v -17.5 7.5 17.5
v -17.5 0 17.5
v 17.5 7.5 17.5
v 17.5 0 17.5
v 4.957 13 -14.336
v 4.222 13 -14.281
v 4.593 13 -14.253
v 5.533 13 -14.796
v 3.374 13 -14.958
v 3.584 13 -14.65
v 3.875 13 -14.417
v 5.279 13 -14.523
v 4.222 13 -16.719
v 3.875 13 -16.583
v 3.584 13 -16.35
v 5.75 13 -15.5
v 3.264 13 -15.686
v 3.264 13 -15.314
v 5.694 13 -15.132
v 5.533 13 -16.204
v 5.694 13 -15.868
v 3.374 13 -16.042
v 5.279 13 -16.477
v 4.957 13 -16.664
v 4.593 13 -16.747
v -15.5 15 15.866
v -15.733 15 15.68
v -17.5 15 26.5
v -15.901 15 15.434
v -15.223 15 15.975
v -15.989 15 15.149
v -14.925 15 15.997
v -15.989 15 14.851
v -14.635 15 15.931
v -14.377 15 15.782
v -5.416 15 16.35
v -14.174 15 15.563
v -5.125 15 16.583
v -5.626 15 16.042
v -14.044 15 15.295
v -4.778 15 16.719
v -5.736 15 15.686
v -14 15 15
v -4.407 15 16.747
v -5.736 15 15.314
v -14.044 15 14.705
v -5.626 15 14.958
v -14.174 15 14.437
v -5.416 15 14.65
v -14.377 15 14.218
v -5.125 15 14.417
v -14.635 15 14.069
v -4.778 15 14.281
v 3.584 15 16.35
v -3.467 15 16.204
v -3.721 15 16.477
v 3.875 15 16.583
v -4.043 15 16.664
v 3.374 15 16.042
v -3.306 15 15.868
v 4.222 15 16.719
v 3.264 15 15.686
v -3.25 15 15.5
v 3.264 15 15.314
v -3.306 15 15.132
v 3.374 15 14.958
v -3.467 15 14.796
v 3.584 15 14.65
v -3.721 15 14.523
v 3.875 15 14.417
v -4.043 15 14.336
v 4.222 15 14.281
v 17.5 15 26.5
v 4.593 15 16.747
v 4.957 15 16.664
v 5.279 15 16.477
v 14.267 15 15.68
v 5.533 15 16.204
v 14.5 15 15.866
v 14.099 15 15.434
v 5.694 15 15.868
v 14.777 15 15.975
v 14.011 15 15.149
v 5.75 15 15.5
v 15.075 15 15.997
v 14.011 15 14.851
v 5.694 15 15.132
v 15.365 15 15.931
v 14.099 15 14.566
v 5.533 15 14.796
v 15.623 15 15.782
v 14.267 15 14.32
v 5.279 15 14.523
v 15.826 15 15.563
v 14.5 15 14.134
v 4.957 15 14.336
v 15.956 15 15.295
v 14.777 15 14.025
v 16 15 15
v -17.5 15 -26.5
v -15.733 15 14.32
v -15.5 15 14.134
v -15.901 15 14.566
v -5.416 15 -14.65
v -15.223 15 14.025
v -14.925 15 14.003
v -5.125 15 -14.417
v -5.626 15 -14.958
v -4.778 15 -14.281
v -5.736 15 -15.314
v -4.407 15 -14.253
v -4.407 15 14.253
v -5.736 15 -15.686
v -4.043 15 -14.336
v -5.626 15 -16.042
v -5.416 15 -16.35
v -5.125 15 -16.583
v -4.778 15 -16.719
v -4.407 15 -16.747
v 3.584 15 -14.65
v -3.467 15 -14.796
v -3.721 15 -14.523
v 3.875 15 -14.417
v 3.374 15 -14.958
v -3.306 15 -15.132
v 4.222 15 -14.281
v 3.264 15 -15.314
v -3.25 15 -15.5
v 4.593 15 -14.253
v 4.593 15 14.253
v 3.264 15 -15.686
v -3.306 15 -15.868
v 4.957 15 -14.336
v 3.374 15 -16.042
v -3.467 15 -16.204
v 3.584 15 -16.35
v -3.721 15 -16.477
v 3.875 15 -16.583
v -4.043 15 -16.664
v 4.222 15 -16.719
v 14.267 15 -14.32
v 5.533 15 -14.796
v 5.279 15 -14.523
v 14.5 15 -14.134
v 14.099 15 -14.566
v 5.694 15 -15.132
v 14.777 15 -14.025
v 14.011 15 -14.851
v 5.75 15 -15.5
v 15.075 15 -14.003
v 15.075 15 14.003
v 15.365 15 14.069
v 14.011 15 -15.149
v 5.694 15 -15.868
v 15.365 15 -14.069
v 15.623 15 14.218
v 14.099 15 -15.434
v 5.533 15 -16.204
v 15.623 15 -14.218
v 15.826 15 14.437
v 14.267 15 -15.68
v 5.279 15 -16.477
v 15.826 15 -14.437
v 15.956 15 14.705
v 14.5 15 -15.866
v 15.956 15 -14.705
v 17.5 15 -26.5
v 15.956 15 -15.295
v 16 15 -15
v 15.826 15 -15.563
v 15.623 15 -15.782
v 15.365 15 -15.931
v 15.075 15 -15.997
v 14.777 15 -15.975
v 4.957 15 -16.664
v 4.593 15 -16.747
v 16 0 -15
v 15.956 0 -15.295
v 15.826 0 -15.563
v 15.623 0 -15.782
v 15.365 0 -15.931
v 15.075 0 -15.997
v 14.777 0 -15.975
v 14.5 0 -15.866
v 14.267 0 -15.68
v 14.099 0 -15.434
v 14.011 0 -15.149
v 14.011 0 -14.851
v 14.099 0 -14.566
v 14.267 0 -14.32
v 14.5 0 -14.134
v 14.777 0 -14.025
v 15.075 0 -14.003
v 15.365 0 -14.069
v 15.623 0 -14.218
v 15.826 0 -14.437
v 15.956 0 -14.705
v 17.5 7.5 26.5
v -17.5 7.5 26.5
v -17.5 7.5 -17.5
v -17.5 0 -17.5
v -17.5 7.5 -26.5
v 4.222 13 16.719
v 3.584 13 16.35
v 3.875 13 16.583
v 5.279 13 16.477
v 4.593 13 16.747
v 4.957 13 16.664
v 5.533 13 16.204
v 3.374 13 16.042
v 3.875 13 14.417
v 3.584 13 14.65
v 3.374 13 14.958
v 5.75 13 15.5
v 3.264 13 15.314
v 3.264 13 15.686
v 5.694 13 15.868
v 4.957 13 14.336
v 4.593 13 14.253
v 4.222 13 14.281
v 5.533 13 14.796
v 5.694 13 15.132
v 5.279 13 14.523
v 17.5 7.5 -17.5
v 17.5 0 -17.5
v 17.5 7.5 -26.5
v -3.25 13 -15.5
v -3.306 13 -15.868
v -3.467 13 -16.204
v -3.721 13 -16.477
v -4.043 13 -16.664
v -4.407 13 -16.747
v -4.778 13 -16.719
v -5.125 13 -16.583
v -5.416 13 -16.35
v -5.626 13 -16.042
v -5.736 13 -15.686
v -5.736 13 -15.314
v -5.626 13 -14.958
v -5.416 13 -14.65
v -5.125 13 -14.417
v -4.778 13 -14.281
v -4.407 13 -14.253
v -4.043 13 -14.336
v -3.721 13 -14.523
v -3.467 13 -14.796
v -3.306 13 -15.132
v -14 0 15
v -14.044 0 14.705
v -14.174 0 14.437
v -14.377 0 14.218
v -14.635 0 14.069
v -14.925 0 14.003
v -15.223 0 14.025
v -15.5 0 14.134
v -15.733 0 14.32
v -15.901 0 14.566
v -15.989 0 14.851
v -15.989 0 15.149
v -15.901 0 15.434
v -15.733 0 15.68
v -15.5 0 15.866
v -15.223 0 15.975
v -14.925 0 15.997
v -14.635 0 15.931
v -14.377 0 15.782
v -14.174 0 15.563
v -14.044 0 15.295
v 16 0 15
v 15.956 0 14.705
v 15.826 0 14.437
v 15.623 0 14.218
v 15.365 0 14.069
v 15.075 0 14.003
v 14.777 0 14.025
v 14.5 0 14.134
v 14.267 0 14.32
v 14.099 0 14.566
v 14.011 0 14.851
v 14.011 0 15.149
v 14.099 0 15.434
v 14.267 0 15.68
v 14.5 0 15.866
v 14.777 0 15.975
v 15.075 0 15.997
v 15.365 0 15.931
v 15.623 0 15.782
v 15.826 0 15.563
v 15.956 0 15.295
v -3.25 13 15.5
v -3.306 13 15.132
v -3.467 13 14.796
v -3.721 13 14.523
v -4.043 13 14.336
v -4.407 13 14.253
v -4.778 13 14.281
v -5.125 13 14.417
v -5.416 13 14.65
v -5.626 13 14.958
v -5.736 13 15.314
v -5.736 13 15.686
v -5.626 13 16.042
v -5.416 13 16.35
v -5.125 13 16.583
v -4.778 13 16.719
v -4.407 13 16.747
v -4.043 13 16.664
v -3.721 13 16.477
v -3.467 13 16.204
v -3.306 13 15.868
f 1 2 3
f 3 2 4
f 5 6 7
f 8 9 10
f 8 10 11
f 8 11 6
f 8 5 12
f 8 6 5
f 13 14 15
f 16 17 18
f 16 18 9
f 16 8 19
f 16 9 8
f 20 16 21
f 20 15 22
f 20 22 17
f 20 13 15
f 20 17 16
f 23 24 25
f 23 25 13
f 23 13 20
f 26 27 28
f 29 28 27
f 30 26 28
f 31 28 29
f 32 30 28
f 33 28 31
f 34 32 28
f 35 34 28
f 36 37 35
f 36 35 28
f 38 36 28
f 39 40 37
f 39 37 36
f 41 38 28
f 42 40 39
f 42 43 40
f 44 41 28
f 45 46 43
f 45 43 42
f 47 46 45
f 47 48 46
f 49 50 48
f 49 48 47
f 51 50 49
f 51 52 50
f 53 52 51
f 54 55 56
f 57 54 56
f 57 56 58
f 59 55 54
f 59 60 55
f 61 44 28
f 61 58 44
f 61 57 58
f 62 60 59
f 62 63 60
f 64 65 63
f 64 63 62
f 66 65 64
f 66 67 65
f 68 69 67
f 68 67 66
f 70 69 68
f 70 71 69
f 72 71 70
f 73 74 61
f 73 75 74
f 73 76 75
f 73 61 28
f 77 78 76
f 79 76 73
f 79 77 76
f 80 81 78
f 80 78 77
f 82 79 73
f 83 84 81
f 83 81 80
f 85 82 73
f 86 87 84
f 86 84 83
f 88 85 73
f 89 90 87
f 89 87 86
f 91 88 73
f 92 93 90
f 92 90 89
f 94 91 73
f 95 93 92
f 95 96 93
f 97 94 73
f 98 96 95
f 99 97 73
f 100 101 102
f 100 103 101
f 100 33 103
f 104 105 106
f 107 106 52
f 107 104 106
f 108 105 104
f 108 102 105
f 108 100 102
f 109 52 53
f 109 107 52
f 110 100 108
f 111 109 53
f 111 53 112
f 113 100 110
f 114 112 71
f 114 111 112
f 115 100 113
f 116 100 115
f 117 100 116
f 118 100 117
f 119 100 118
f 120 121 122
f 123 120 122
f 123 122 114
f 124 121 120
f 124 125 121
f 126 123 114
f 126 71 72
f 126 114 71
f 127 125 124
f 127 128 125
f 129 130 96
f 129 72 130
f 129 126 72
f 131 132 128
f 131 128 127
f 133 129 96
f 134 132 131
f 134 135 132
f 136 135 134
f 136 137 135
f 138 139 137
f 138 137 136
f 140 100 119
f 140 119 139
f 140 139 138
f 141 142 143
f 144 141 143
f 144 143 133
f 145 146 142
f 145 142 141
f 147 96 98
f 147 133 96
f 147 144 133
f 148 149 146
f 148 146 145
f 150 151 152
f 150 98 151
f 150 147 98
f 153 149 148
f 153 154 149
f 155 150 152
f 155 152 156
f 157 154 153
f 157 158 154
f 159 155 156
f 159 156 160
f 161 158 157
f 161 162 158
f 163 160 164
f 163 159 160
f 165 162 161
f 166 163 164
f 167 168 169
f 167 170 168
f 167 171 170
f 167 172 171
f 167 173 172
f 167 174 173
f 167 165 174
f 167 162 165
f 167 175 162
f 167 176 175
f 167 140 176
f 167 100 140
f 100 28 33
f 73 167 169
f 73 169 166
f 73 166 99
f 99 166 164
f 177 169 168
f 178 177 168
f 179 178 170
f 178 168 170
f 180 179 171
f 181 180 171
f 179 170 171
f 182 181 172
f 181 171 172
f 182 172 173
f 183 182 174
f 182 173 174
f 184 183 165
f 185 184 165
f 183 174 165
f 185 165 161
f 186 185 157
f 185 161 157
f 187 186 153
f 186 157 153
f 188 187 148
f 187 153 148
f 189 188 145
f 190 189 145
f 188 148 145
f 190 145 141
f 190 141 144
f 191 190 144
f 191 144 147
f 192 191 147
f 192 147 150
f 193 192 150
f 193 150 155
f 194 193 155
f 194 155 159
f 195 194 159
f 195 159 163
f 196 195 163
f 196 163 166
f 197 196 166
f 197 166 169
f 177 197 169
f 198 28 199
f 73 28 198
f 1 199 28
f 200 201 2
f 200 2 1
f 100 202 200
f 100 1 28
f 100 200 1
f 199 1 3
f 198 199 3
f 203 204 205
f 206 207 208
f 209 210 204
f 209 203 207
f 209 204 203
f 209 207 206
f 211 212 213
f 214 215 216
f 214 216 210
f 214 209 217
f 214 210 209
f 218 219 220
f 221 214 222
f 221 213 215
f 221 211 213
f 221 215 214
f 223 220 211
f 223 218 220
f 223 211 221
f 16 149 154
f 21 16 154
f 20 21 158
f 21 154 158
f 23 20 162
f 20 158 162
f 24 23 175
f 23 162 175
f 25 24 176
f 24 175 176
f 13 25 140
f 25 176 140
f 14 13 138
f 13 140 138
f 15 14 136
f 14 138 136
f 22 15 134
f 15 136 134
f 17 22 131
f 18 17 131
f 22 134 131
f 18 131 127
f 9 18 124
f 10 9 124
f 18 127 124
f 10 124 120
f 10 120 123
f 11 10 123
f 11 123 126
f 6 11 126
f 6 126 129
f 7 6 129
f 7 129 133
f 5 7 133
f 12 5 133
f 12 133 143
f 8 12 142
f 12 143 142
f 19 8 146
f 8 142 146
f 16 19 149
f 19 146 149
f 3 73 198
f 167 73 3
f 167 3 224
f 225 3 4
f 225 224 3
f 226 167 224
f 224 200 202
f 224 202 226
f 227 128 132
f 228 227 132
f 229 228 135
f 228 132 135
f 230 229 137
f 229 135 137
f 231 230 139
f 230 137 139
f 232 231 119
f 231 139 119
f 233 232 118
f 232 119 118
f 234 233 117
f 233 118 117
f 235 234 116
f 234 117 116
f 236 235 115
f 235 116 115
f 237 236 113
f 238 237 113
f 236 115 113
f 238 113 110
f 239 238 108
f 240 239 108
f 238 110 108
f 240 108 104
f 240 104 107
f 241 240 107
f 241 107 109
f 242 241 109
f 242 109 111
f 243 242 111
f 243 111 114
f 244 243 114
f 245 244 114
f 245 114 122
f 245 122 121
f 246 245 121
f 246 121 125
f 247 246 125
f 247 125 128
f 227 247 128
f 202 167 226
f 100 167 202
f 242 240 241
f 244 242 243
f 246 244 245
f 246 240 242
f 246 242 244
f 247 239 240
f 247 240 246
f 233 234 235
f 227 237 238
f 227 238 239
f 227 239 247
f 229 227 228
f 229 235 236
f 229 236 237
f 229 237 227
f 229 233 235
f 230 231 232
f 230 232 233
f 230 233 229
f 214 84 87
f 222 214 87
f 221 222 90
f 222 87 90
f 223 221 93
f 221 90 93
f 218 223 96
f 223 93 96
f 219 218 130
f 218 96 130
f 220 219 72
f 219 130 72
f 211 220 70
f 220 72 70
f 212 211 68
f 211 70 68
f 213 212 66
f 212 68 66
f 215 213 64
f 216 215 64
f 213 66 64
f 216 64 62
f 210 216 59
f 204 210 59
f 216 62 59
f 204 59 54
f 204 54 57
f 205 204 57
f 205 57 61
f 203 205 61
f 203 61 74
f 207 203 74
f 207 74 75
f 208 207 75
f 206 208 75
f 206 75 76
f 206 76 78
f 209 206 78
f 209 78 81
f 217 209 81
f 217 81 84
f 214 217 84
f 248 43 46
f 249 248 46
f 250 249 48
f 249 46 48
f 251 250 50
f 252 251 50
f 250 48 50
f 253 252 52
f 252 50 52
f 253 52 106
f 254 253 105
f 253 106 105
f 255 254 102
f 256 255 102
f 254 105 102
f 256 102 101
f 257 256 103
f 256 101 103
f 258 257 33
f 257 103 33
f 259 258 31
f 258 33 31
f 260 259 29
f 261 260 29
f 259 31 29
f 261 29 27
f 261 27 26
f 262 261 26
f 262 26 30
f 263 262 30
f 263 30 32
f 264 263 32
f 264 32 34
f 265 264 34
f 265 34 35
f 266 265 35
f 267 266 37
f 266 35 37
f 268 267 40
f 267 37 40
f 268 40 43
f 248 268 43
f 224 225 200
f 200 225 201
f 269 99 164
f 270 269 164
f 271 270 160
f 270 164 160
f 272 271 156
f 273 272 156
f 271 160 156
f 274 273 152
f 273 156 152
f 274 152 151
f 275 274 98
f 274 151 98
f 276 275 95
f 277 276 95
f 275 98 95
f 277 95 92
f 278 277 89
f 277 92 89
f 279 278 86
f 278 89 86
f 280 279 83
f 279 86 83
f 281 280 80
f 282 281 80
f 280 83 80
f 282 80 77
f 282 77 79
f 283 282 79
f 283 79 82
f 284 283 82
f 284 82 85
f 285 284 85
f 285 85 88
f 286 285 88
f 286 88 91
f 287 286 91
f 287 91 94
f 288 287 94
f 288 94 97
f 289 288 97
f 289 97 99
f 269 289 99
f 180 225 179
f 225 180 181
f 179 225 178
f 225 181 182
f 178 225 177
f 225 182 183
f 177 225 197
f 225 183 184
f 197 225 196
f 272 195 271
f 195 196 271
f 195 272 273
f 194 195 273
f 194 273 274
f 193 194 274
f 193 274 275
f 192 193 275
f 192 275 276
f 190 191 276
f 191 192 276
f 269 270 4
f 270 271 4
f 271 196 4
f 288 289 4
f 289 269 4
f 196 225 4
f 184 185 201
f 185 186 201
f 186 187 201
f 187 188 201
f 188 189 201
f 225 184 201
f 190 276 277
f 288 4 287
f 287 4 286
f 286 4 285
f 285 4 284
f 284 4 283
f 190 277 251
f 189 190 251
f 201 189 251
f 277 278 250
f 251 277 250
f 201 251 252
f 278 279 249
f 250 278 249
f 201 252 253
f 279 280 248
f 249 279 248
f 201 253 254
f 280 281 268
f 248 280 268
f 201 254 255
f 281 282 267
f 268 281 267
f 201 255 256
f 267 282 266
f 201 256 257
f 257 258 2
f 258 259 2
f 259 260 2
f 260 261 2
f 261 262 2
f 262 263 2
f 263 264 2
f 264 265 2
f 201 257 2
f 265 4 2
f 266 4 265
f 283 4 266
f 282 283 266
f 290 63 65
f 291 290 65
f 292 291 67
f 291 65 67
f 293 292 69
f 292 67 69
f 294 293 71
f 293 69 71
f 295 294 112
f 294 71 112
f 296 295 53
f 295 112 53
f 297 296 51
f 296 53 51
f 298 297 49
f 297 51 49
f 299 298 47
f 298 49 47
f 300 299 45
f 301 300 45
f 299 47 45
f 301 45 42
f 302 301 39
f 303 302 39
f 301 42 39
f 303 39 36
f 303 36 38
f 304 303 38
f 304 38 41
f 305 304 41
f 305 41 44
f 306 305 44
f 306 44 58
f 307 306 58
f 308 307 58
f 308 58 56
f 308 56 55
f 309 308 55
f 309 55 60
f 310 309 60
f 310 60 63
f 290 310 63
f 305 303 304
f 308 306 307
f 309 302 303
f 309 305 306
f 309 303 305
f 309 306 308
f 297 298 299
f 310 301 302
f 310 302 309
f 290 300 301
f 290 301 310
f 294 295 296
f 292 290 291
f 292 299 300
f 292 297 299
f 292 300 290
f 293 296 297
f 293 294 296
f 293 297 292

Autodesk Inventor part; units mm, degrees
ref_plane "YZ Plane" through (0, 0, 0) normal (1, 0, 0) x (0, 1, 0)
ref_plane "XZ Plane" through (0, 0, 0) normal (0, 1, 0) x (-1, 0, 0)
ref_plane "XY Plane" through (0, 0, 0) normal (0, 0, 1) x (1, 0, 0)
sketch "Sketch1" plane through (0, 0, 0) normal (0, 1, 0) x (-1, 0, 0)
  line L0 (-17.5, -17.5) -> (17.5, -17.5)
  line L1 (17.5, -17.5) -> (17.5, 17.5)
  line L2 (17.5, 17.5) -> (-17.5, 17.5)
  line L3 (-17.5, 17.5) -> (-17.5, -17.5)
  line L4 (-17.5, -17.5) -> (17.5, 17.5) construction
  line L5 (17.5, -17.5) -> (-17.5, 17.5) construction
  point P0 (0, 0)
  dimension "d0" = 35
  dimension "d1" = 35
extrude "Extrusion1" add sketch "Sketch1" along normal blind 15
sketch "Sketch2" plane through (0, 15, 0) normal (0, 1, 0) x (1, 0, 0)
  circle A0 centre (15, -15) radius 1
  circle A1 centre (-15, -15) radius 1
  circle A2 centre (15, 15) radius 1
  point P0 (0, 0)
  dimension "d10" = 2
  dimension "d11" = 15
  dimension "d12" = 15
  dimension "d13" = 2
  dimension "d14" = 15
  dimension "d15" = 15
  dimension "d16" = 2
  dimension "d17" = 15
  dimension "d18" = 15
extrude "Extrusion2" cut sketch "Sketch2" against normal blind 15
sketch "Sketch3" plane through (17.5, 0, -17.5) normal (0, 0, -1) x (-1, 0, 0)
  line L0 (0, 0) -> (0, 15) projected
  line L1 (35, 0) -> (35, 15) projected
  line L2 (0, 15) -> (35, 15)
  line L3 (35, 15) -> (35, 7.5)
  line L4 (35, 7.5) -> (0, 7.5)
  line L5 (0, 7.5) -> (0, 15)
  point P0 (17.5, 0)
extrude "Extrusion3" add sketch "Sketch3" along normal blind 9
sketch "Sketch4" plane through (-17.5, 0, 17.5) normal (0, 0, 1) x (1, 0, 0)
  line L0 (0, 15) -> (35, 15) projected
  line L1 (0, 7.5) -> (35, 7.5) projected
  line L2 (0, 15) -> (35, 15)
  line L3 (35, 15) -> (35, 7.5)
  line L4 (35, 7.5) -> (0, 7.5)
  line L5 (0, 7.5) -> (0, 15)
  point P0 (17.5, 0)
extrude "Extrusion4" add sketch "Sketch4" along normal blind 9
sketch "Sketch5" plane through (0, 15, 0) normal (0, 1, 0) x (1, 0, 0)
  circle A0 centre (4.5, -15.5) radius 1.25
  line L0 (-17.5, -26.5) -> (-17.5, 26.5) projected
  line L1 (-17.5, 0) -> (17.5, 0)
  line L2 (17.5, 26.5) -> (17.5, -26.5) projected
  line L3 (0, -26.5) -> (0, 26.5)
  line L4 (-26.5, 0) -> (8.5, 0)
  circle A1 centre (-4.5, -15.5) radius 1.25
  line L5 (-17.5, 31) -> (17.5, 31)
  circle A2 centre (4.5, 15.5) radius 1.25
  line L6 (-26.5, 31) -> (8.5, 31)
  circle A3 centre (-4.5, 15.5) radius 1.25
  point P0 (0, 0)
  dimension "d25" = 15.5
  dimension "d26" = 4.5
  dimension "d27" = 2.5
  dimension "d30" = 9
  dimension "d33" = 31
extrude "Extrusion5" cut sketch "Sketch5" against normal blind 2
properties part number "actuator"
